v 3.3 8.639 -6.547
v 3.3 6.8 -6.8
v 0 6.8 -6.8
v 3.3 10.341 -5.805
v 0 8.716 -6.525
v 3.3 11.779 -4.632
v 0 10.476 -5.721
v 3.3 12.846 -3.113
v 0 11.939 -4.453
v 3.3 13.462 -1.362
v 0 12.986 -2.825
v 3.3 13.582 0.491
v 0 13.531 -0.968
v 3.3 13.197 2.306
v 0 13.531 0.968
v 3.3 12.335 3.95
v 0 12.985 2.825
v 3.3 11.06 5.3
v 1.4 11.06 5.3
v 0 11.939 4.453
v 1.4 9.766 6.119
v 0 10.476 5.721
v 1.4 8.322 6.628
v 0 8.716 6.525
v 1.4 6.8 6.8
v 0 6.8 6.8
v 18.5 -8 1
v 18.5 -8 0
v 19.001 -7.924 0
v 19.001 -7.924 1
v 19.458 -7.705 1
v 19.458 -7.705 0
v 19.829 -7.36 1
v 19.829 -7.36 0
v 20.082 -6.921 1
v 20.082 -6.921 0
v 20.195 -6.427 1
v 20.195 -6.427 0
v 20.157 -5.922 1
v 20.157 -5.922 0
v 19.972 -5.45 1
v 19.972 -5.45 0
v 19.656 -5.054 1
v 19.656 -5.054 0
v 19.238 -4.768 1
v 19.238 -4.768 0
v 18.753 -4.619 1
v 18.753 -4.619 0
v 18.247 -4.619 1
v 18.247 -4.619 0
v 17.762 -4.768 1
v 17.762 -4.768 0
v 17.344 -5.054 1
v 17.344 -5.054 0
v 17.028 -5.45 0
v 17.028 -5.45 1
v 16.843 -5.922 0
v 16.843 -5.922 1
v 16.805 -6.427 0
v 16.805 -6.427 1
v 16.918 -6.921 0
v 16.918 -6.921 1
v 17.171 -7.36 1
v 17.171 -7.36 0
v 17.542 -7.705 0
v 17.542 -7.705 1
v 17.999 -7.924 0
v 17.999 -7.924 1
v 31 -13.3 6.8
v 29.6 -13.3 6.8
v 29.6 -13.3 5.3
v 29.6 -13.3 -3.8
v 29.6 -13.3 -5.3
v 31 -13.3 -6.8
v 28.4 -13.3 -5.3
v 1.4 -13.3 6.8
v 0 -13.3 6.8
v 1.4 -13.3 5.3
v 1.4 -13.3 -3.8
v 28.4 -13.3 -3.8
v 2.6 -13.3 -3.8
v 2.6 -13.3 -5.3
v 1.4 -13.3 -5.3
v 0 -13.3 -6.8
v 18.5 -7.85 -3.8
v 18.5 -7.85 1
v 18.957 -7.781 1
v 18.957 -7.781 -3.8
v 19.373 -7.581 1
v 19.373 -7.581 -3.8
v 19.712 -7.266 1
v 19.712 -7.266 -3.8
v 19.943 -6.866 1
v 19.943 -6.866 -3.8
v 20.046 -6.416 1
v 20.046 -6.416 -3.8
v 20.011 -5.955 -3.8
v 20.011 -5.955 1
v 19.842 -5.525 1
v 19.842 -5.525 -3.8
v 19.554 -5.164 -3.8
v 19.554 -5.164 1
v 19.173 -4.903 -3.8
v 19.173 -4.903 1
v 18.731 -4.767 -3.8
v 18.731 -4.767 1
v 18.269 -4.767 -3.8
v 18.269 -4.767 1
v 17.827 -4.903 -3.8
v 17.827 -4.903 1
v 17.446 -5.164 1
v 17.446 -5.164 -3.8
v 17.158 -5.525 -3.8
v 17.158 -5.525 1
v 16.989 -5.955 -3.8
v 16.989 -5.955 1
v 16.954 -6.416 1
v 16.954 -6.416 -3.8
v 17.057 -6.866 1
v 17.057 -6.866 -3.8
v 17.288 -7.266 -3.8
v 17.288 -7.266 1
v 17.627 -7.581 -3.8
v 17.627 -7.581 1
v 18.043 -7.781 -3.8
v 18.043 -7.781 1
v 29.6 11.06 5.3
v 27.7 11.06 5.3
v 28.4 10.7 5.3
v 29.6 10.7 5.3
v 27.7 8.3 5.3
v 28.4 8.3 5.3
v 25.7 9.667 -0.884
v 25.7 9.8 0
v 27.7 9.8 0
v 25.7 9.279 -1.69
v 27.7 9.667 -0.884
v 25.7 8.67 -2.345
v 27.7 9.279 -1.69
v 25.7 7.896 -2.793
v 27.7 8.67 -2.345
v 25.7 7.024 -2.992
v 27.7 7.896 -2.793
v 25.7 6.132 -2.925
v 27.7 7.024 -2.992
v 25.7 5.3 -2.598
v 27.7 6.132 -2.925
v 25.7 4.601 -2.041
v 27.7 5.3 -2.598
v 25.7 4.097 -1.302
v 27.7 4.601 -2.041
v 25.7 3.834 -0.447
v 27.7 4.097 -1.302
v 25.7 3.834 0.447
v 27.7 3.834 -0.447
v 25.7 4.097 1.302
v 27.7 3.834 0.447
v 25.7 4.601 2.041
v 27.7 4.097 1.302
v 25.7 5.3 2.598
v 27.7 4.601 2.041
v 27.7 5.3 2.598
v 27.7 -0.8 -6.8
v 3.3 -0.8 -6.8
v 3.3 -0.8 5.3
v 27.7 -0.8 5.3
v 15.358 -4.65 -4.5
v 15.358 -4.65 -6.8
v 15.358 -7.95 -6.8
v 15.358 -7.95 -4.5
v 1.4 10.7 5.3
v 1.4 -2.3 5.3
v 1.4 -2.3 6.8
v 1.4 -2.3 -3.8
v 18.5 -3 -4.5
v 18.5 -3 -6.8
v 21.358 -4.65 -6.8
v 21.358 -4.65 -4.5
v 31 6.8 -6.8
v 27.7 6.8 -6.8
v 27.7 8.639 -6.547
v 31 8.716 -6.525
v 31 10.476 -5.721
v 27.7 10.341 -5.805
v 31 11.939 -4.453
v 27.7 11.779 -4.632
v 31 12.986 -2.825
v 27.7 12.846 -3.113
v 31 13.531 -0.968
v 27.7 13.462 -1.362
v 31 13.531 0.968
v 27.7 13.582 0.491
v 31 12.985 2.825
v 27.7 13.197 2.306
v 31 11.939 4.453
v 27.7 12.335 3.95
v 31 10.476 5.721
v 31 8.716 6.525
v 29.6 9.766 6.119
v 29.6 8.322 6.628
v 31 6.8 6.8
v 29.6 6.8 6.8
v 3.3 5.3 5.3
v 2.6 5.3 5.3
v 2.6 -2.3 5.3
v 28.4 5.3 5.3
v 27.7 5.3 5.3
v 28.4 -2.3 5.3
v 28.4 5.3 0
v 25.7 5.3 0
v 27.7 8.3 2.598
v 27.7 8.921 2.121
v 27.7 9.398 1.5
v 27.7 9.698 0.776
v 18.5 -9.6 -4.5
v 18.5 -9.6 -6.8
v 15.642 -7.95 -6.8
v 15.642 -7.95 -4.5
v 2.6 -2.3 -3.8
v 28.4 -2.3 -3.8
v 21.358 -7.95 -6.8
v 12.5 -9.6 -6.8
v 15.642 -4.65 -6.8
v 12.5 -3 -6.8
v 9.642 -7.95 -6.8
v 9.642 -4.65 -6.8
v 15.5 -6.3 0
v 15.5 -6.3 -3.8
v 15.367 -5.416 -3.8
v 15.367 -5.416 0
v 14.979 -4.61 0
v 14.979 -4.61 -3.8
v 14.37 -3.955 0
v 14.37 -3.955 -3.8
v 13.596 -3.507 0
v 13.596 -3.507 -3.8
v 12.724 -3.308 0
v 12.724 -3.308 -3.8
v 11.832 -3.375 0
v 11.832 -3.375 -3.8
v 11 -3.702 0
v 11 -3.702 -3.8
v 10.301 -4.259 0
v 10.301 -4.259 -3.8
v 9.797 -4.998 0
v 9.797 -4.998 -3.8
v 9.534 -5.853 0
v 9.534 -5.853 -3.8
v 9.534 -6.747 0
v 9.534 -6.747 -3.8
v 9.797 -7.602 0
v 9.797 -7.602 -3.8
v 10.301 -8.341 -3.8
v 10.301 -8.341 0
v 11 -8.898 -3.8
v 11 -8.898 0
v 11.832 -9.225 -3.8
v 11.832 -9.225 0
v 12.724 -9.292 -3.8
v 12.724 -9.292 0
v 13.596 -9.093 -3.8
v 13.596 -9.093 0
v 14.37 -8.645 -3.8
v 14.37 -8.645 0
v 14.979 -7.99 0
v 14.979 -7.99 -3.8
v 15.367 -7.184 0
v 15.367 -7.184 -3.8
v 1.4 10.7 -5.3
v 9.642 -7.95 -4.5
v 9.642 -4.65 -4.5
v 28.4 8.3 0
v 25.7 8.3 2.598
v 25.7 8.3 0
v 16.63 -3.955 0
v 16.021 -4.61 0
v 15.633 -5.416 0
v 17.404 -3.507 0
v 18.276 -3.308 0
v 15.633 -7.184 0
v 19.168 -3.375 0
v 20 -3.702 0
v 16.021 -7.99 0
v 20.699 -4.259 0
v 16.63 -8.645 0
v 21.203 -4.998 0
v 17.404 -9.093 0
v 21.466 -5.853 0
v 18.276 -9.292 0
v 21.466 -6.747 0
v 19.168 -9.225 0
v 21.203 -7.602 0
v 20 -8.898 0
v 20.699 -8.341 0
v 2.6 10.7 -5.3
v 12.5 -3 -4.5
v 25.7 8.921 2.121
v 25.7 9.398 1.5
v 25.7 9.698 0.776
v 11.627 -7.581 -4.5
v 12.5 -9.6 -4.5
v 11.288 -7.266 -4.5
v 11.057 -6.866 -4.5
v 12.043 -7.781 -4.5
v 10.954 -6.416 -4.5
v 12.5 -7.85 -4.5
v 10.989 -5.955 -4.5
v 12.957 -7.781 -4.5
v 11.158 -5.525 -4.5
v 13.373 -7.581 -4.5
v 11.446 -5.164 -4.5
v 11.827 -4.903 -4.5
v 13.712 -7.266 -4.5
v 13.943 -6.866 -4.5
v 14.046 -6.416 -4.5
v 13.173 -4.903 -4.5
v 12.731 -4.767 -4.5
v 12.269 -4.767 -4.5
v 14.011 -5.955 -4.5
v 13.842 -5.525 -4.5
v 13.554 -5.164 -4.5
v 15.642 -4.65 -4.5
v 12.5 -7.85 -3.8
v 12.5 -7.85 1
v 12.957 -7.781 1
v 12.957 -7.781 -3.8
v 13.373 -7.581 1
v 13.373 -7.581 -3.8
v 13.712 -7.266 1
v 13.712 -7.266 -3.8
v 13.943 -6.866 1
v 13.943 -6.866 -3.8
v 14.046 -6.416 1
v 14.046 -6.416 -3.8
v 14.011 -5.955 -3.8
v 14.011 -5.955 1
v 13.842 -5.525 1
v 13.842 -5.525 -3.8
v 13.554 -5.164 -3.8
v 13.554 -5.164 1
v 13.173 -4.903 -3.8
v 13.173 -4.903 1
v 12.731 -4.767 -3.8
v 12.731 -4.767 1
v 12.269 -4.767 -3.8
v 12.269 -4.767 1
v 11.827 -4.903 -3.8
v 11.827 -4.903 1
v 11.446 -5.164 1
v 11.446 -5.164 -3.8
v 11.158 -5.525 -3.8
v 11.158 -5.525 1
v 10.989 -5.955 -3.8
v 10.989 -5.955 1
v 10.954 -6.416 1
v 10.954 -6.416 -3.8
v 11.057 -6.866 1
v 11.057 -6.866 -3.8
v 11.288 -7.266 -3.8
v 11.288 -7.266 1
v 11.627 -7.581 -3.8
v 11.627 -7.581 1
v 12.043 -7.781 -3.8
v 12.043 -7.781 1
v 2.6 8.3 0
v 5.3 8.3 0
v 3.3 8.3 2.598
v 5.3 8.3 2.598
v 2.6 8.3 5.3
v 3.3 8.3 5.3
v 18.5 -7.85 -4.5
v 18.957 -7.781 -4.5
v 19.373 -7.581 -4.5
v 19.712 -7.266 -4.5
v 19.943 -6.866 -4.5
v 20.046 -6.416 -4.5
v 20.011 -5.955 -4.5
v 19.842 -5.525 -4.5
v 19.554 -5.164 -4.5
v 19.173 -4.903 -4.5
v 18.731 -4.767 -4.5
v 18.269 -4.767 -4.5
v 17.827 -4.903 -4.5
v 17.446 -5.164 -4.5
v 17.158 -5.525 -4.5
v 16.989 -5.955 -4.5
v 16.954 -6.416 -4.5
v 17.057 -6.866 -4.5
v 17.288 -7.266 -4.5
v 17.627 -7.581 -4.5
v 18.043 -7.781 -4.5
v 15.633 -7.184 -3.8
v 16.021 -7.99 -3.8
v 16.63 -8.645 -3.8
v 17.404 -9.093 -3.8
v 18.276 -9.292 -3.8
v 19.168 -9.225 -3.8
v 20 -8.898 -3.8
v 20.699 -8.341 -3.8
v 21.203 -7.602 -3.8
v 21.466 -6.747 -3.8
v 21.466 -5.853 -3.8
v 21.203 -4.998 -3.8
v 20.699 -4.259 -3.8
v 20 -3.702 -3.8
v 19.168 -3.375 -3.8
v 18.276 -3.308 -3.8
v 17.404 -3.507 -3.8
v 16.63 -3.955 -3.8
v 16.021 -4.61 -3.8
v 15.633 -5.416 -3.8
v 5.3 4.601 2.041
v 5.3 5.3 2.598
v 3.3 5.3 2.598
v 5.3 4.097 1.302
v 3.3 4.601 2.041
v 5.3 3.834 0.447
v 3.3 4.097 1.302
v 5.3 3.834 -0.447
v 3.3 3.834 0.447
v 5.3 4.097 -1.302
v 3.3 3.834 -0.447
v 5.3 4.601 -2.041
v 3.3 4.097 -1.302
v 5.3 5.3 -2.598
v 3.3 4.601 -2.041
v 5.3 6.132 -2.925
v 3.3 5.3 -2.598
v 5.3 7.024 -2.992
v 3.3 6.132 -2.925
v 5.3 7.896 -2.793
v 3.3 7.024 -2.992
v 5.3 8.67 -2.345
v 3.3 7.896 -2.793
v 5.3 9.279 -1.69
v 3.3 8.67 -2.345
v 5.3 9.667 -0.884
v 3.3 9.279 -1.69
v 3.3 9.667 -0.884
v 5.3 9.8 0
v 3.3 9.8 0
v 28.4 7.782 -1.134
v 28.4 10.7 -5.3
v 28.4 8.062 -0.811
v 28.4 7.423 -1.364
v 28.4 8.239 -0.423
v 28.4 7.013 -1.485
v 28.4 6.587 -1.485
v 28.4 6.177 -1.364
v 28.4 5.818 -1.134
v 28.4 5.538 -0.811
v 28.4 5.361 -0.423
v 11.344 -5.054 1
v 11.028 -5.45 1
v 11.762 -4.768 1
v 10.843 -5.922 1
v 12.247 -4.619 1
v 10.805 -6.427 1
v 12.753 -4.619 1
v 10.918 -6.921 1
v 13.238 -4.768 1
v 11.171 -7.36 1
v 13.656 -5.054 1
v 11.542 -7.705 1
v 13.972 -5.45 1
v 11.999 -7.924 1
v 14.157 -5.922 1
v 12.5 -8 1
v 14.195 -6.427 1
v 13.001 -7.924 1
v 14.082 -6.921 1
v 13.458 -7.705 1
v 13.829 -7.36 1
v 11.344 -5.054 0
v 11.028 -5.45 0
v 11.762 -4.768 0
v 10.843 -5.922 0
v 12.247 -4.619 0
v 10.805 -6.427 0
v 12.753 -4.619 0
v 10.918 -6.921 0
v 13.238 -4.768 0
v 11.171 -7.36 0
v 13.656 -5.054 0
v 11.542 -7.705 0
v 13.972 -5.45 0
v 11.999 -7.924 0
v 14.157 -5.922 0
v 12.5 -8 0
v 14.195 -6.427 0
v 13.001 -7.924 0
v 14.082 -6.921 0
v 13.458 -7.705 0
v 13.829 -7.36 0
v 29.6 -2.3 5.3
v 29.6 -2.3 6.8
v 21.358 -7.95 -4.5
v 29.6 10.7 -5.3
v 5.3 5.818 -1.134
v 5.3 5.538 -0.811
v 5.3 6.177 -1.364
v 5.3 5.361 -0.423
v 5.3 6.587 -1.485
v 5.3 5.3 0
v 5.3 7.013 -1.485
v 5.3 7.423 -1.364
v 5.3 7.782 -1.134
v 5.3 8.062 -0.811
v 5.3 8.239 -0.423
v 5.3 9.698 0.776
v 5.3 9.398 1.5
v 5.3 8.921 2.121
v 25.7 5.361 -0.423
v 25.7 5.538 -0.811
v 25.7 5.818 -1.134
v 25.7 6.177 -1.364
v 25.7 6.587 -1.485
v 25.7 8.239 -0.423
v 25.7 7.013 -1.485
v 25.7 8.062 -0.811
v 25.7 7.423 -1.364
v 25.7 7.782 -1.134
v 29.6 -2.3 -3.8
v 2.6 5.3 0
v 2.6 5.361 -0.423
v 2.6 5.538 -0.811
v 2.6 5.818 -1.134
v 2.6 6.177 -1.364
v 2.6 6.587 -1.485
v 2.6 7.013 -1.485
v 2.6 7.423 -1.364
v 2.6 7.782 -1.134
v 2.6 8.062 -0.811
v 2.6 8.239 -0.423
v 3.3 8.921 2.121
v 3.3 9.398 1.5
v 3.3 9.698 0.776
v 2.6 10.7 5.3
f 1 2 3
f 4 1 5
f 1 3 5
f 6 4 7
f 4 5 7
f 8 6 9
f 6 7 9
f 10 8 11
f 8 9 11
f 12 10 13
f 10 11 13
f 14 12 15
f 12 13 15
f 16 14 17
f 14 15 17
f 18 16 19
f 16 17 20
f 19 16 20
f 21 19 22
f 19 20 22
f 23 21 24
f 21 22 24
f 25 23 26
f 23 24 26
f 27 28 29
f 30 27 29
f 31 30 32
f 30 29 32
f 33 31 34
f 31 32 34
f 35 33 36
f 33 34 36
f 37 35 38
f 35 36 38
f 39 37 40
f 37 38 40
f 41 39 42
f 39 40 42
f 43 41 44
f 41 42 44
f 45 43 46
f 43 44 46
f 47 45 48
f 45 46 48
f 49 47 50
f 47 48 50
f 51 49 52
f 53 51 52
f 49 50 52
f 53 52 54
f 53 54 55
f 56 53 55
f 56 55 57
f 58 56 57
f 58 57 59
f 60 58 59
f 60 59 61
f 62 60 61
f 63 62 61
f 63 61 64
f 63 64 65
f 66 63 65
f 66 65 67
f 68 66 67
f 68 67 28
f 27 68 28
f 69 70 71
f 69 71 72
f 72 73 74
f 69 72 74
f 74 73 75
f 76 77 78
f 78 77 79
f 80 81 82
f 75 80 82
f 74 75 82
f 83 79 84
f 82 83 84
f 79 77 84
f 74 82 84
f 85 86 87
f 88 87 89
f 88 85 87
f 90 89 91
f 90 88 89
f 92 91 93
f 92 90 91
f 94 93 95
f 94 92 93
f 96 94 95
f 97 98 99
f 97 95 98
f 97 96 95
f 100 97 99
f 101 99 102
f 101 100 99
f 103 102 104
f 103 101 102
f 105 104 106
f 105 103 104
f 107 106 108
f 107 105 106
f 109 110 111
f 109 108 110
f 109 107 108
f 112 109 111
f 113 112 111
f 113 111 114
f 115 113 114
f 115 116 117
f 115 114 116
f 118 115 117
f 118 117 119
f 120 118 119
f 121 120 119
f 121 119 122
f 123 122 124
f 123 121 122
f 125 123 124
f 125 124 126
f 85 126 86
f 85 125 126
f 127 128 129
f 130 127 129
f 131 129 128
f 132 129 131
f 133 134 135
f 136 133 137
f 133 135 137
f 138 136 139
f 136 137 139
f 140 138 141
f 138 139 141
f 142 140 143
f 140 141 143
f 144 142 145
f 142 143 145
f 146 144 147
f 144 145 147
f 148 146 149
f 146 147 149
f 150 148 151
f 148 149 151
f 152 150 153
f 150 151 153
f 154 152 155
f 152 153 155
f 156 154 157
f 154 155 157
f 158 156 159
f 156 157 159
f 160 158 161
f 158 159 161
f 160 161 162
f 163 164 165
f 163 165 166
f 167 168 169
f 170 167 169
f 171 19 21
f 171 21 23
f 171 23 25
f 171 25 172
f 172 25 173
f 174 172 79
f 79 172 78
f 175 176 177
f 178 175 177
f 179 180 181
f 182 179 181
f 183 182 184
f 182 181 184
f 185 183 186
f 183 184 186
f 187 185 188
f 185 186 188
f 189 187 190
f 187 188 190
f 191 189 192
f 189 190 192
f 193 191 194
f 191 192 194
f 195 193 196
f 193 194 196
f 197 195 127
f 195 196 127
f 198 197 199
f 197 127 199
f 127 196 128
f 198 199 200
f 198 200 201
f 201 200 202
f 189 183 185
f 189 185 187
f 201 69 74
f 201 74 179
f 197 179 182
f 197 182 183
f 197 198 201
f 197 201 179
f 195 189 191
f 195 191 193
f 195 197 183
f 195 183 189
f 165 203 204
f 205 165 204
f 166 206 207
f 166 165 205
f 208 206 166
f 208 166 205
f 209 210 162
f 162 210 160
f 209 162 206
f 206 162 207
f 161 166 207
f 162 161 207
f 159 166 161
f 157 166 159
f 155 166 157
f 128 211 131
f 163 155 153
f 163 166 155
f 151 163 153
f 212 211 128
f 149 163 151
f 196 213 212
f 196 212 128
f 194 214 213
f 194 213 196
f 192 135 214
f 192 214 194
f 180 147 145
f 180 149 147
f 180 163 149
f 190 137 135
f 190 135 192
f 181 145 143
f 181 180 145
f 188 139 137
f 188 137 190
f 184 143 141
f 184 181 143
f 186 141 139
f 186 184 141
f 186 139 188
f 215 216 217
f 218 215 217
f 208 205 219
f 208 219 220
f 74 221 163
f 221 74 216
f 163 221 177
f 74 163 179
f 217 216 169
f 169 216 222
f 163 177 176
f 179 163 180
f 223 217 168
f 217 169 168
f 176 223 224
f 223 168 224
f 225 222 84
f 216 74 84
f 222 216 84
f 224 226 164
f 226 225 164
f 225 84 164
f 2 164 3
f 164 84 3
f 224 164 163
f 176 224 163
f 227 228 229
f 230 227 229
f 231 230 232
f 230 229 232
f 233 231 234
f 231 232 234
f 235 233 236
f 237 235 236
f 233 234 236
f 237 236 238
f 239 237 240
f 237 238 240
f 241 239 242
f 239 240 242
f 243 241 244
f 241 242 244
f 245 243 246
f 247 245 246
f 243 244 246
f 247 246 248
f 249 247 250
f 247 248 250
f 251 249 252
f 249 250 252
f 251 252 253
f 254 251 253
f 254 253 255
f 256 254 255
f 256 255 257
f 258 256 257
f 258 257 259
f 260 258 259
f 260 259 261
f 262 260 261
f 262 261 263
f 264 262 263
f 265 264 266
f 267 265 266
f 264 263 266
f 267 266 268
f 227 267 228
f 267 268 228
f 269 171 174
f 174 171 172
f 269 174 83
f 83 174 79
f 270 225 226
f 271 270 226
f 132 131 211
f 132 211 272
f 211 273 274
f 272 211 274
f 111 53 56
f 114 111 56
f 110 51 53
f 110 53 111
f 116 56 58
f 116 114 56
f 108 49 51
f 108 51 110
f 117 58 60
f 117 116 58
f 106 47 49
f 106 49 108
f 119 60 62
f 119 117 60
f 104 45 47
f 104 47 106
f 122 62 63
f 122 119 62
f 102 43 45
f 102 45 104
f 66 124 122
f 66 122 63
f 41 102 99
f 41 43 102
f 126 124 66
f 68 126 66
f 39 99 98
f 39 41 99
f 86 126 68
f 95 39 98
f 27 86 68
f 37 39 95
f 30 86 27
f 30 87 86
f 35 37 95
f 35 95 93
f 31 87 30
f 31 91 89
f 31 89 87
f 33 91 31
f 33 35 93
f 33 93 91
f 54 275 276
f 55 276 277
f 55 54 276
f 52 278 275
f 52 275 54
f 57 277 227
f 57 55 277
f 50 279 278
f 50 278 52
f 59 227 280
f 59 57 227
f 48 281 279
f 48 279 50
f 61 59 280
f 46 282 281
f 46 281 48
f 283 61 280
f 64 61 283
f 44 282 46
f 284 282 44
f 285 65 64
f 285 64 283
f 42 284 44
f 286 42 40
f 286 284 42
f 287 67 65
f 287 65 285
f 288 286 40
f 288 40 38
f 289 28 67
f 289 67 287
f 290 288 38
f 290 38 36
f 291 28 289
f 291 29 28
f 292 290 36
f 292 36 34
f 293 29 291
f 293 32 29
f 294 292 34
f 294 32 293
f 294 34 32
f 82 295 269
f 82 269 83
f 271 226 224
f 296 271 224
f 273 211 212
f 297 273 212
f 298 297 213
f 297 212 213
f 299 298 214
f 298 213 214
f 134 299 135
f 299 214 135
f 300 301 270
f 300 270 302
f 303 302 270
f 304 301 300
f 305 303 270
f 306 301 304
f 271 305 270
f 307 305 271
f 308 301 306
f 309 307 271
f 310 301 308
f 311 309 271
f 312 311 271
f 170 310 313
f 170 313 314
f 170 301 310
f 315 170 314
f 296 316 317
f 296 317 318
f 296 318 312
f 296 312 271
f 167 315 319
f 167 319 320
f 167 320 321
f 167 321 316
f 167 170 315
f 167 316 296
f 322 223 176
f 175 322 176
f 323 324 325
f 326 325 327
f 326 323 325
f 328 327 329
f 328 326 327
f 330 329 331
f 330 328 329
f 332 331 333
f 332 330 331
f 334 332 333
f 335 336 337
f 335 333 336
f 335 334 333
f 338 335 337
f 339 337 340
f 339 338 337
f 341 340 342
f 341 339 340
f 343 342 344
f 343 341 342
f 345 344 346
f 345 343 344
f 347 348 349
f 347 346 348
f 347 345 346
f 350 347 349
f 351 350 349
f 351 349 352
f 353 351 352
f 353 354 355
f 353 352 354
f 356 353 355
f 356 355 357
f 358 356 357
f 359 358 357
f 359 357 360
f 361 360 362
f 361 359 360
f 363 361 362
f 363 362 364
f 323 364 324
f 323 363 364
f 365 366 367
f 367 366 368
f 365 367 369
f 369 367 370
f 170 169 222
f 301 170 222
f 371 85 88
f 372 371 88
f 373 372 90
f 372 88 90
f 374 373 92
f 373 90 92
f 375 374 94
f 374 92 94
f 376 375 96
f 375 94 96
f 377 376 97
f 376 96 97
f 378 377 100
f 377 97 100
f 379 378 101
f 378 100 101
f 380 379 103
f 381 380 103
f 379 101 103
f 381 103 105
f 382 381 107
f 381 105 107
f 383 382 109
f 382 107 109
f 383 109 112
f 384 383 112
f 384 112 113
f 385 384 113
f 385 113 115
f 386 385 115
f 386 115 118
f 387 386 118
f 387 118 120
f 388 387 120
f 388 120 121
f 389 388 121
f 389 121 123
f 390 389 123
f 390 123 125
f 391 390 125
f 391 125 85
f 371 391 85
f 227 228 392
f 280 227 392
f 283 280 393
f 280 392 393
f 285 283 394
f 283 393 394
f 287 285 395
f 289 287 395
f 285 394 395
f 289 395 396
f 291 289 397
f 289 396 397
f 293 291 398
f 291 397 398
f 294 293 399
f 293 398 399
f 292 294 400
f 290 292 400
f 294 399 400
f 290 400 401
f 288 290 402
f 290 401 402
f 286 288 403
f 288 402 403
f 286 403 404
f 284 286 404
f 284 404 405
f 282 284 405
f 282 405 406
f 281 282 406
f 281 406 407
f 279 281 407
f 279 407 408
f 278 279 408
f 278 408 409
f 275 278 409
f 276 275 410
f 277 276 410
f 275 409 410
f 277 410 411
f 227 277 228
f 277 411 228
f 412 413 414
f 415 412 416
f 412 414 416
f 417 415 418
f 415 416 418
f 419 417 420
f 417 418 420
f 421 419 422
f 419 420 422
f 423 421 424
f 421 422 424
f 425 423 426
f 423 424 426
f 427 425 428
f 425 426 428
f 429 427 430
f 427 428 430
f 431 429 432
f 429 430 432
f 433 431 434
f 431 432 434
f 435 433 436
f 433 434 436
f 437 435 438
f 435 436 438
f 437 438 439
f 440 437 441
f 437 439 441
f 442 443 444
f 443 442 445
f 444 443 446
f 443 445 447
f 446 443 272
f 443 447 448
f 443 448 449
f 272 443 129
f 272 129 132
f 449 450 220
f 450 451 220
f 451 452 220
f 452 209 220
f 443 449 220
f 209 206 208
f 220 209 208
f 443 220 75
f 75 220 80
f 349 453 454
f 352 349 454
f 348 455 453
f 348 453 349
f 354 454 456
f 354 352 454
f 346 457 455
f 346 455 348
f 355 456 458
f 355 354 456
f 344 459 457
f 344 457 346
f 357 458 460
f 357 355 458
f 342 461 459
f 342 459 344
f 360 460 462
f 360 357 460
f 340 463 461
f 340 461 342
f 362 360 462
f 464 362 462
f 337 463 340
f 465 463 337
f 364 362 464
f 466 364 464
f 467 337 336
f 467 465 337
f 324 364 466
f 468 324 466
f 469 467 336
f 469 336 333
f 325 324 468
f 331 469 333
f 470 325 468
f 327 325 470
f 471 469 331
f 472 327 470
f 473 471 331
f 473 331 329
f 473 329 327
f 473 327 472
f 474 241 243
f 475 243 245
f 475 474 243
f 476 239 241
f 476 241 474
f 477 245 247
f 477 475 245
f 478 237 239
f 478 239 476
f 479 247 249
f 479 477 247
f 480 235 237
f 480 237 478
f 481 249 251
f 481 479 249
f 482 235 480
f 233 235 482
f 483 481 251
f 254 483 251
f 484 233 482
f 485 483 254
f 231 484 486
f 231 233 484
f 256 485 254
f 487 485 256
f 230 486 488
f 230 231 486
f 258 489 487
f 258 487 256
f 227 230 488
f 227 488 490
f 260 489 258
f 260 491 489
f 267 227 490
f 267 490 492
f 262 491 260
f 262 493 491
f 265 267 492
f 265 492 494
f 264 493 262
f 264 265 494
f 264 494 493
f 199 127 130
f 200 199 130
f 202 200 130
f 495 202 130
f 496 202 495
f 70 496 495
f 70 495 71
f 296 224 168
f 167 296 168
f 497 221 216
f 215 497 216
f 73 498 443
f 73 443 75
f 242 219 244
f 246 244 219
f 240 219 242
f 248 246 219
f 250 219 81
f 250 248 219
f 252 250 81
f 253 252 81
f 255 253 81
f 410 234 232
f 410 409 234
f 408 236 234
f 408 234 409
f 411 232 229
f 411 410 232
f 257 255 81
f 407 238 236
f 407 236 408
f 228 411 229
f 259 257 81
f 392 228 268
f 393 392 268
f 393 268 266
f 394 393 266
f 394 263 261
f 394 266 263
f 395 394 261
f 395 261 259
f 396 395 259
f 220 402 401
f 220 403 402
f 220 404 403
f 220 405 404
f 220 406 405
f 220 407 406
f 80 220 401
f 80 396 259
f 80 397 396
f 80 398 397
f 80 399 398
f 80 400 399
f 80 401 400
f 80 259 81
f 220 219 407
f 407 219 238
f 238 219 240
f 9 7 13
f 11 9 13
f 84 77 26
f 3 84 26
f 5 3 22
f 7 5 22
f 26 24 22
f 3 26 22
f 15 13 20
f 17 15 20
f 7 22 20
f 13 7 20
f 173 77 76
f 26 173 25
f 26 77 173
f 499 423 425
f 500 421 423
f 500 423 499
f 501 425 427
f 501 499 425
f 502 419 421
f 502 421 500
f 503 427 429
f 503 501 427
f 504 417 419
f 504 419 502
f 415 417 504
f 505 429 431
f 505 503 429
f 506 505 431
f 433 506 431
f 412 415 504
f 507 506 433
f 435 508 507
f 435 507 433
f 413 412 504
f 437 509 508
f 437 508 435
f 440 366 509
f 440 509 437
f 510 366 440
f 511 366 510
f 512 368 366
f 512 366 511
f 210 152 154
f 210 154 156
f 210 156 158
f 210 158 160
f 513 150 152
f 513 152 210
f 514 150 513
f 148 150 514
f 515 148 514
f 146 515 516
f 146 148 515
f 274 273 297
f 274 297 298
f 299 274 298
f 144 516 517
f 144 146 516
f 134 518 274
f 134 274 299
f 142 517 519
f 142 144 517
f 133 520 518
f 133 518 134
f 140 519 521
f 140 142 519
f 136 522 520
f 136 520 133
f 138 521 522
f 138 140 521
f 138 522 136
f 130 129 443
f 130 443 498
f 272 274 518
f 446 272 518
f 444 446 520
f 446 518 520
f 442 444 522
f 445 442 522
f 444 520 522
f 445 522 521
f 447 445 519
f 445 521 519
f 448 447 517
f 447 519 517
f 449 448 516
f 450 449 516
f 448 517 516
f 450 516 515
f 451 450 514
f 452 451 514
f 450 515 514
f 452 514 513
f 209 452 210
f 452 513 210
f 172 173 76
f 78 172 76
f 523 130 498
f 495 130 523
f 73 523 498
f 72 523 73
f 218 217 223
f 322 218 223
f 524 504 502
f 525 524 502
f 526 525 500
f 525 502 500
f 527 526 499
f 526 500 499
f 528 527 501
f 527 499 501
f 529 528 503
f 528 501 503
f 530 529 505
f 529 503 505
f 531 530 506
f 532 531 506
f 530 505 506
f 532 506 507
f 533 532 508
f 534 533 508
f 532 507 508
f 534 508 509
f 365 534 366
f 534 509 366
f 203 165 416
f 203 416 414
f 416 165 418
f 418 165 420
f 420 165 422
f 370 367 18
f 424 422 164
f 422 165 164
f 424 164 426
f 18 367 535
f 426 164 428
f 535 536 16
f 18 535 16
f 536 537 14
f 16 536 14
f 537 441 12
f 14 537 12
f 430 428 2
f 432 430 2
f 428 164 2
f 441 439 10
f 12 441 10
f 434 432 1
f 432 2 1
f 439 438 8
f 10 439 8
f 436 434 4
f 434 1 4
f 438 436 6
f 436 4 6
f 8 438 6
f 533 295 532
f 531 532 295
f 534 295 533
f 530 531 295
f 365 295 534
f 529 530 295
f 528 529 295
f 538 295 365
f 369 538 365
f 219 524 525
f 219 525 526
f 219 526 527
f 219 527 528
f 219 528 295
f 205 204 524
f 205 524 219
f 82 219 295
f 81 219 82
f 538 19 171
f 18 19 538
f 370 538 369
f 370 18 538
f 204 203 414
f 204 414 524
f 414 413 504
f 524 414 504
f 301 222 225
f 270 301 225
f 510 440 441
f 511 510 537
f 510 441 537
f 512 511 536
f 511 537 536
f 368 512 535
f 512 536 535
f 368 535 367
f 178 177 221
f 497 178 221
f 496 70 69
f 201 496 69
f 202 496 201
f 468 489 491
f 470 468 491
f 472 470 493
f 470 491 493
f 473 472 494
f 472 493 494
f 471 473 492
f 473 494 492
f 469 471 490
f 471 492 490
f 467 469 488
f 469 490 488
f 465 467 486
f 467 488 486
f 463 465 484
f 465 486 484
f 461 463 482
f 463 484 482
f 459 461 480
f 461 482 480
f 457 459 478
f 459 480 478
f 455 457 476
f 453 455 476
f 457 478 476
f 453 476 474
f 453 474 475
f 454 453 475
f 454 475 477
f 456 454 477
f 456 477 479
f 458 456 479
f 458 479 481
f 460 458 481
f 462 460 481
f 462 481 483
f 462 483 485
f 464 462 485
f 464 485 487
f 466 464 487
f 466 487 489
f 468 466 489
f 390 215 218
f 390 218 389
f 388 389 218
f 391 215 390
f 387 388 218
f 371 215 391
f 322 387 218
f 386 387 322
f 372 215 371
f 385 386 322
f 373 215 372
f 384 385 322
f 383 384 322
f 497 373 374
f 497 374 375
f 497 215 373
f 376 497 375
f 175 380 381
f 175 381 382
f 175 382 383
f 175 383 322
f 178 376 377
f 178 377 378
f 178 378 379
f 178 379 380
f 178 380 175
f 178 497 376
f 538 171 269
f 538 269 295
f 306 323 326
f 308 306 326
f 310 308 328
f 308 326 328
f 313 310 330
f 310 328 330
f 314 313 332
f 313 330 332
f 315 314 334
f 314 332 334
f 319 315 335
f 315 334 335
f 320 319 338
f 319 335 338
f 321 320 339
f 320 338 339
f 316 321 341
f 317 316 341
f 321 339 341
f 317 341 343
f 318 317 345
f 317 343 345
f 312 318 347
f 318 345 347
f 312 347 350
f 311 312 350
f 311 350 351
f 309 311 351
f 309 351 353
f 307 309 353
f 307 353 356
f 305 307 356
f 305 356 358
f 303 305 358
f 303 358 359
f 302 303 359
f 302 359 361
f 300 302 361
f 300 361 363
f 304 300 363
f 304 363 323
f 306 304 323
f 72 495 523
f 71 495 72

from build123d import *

# Parameters (mm, degrees)
PAD_DEPTH            = 31
SKETCH001_W          = 11
SKETCH001_H          = 28.2
POCKET_DEPTH         = 10.6
SKETCH002_R          = 3
PAD001_DEPTH         = 3.8
SKETCH003_R          = 1.7
PAD002_DEPTH         = 4.8
SKETCH004_R          = 1.55
POCKET001_DEPTH      = 3.001
POCKET001_DEPTH_BACK = -10.601
POCKET002_DEPTH      = 2.3
SKETCH006_W          = 16
SKETCH006_H          = 28.2
POCKET003_DEPTH      = 1.5
SKETCH007_W          = 24
SKETCH007_H          = 1.2
POCKET004_DEPTH      = 10.6
SKETCH008_W          = 15
SKETCH008_H          = 24.4
POCKET005_DEPTH      = 13.601
SKETCH009_R          = 3
PAD003_DEPTH         = 2
POCKET006_DEPTH      = 3
SKETCH011_R          = 3
PAD004_DEPTH         = 2
POCKET007_DEPTH      = 3


with BuildPart() as part:
    # Sketch → Pad (new body)
    with BuildSketch(Plane.YZ):
        with BuildLine():
            Line((-13.3, 6.8), (-13.3, -6.8))
            Line((-13.3, -6.8), (6.800033, -6.8))
            ThreePointArc((6.800033, -6.8), (13.6, 3.4e-05), (6.799965, 6.8))
            Line((-13.3, 6.8), (6.799965, 6.8))
        make_face()
    extrude(amount=PAD_DEPTH)

    # Sketch001 (on Face4 of Pad) → Pocket (cut)
    with BuildSketch(Plane(origin=(0, 0, 6.8), x_dir=(0, -1, 0), z_dir=(0, 0, 1))):
        with Locations((7.8, 15.5)):
            Rectangle(SKETCH001_W, SKETCH001_H)
    extrude(amount=-POCKET_DEPTH, mode=Mode.SUBTRACT)

    # Sketch002 (on Face7 of Pocket) → Pad001 (join)
    with BuildSketch(Plane(origin=(0, 0, -3.8), x_dir=(0, -1, 0), z_dir=(0, 0, 1))):
        with Locations((6.3, 18.5)):
            Circle(SKETCH002_R)
        with Locations((6.3, 12.5)):
            Circle(SKETCH002_R)
    extrude(amount=PAD001_DEPTH)

    # Sketch003 (on Face7 of Pad001) → Pad002 (join)
    with BuildSketch(Plane(origin=(0, 0, -3.8), x_dir=(0, -1, 0), z_dir=(0, 0, 1))):
        with Locations((6.3, 18.5)):
            Circle(SKETCH003_R)
        with Locations((6.3, 12.5)):
            Circle(SKETCH003_R)
    extrude(amount=PAD002_DEPTH)

    # Sketch004 (on Face7 of Pad002) → Pocket001 (cut, two sides)
    with BuildSketch(Plane(origin=(0, 0, -3.8), x_dir=(0, -1, 0), z_dir=(0, 0, 1))) as pocket001_sk:
        with Locations((6.3, 18.5)):
            Circle(SKETCH004_R)
        with Locations((6.3, 12.5)):
            Circle(SKETCH004_R)
    extrude(amount=-POCKET001_DEPTH, mode=Mode.SUBTRACT)
    extrude(pocket001_sk.sketch, amount=-POCKET001_DEPTH_BACK, mode=Mode.SUBTRACT)

    # Sketch005 (on Face3 of Pocket001) → Pocket002 (cut)
    with BuildSketch(Plane.YX.offset(6.8)):
        Polygon((-3, 18.5), (-4.65, 21.357884), (-7.95, 21.357884), (-9.6, 18.5), (-7.95, 15.642116), (-4.65, 15.642116), align=None)
        Polygon((-3, 12.5), (-4.65, 15.357884), (-7.95, 15.357884), (-9.6, 12.5), (-7.95, 9.642116), (-4.65, 9.642116), align=None)
    extrude(amount=-POCKET002_DEPTH, mode=Mode.SUBTRACT)

    # Sketch006 (on Face5 of Pocket002) → Pocket003 (cut)
    with BuildSketch(Plane(origin=(0, 0, 6.8), x_dir=(0, -1, 0), z_dir=(0, 0, 1))):
        with Locations((-5.7, 15.5)):
            Rectangle(SKETCH006_W, SKETCH006_H)
    extrude(amount=-POCKET003_DEPTH, mode=Mode.SUBTRACT)

    # Sketch007 (on Face30 of Pocket003) → Pocket004 (cut)
    with BuildSketch(Plane(origin=(0, 0, 5.3), x_dir=(0, -1, 0), z_dir=(0, 0, 1))):
        with Locations((1.3, 2)):
            Rectangle(SKETCH007_W, SKETCH007_H)
        with Locations((1.3, 29)):
            Rectangle(SKETCH007_W, SKETCH007_H)
    extrude(amount=-POCKET004_DEPTH, mode=Mode.SUBTRACT)

    # Sketch008 (on Face3 of Pocket004) → Pocket005 (cut, through all)
    with BuildSketch(Plane.YX.offset(6.8)):
        with Locations((6.7, 15.5)):
            Rectangle(SKETCH008_W, SKETCH008_H)
    extrude(amount=-POCKET005_DEPTH, mode=Mode.SUBTRACT)

    # Sketch009 (on Face19 of Pocket005) → Pad003 (join)
    with BuildSketch(Plane.YZ.offset(3.3)):
        with Locations((6.8, 0)):
            Circle(SKETCH009_R)
    extrude(amount=PAD003_DEPTH)

    # Sketch010 (on Face50 of Pad003) → Pocket006 (cut)
    with BuildSketch(Plane.YZ.offset(5.3)):
        with BuildLine():
            Line((5.3, 5.3), (5.3, 0))
            ThreePointArc((5.3, 0), (6.8, -1.5), (8.3, 0))
            Line((8.3, 0), (8.3, 5.3))
            Line((8.3, 5.3), (5.3, 5.3))
        make_face()
    extrude(amount=-POCKET006_DEPTH, mode=Mode.SUBTRACT)

    # Sketch011 (on Face21 of Pocket006) → Pad004 (join)
    with BuildSketch(Plane(origin=(27.7, 0, 0), x_dir=(0, 1, 0), z_dir=(-1, 0, 0))):
        with Locations((6.8, 0)):
            Circle(SKETCH011_R)
    extrude(amount=PAD004_DEPTH)

    # Sketch012 (on Face57 of Pad004) → Pocket007 (cut)
    with BuildSketch(Plane(origin=(25.7, 0, 0), x_dir=(0, 1, 0), z_dir=(-1, 0, 0))):
        with BuildLine():
            ThreePointArc((8.3, 0), (6.8, 1.5), (5.3, -1e-06))
            Line((5.3, -1e-06), (5.3, -5.3))
            Line((5.3, -5.3), (8.3, -5.3))
            Line((8.3, -5.3), (8.3, 0))
        make_face()
    extrude(amount=-POCKET007_DEPTH, mode=Mode.SUBTRACT)


solid = part.part
